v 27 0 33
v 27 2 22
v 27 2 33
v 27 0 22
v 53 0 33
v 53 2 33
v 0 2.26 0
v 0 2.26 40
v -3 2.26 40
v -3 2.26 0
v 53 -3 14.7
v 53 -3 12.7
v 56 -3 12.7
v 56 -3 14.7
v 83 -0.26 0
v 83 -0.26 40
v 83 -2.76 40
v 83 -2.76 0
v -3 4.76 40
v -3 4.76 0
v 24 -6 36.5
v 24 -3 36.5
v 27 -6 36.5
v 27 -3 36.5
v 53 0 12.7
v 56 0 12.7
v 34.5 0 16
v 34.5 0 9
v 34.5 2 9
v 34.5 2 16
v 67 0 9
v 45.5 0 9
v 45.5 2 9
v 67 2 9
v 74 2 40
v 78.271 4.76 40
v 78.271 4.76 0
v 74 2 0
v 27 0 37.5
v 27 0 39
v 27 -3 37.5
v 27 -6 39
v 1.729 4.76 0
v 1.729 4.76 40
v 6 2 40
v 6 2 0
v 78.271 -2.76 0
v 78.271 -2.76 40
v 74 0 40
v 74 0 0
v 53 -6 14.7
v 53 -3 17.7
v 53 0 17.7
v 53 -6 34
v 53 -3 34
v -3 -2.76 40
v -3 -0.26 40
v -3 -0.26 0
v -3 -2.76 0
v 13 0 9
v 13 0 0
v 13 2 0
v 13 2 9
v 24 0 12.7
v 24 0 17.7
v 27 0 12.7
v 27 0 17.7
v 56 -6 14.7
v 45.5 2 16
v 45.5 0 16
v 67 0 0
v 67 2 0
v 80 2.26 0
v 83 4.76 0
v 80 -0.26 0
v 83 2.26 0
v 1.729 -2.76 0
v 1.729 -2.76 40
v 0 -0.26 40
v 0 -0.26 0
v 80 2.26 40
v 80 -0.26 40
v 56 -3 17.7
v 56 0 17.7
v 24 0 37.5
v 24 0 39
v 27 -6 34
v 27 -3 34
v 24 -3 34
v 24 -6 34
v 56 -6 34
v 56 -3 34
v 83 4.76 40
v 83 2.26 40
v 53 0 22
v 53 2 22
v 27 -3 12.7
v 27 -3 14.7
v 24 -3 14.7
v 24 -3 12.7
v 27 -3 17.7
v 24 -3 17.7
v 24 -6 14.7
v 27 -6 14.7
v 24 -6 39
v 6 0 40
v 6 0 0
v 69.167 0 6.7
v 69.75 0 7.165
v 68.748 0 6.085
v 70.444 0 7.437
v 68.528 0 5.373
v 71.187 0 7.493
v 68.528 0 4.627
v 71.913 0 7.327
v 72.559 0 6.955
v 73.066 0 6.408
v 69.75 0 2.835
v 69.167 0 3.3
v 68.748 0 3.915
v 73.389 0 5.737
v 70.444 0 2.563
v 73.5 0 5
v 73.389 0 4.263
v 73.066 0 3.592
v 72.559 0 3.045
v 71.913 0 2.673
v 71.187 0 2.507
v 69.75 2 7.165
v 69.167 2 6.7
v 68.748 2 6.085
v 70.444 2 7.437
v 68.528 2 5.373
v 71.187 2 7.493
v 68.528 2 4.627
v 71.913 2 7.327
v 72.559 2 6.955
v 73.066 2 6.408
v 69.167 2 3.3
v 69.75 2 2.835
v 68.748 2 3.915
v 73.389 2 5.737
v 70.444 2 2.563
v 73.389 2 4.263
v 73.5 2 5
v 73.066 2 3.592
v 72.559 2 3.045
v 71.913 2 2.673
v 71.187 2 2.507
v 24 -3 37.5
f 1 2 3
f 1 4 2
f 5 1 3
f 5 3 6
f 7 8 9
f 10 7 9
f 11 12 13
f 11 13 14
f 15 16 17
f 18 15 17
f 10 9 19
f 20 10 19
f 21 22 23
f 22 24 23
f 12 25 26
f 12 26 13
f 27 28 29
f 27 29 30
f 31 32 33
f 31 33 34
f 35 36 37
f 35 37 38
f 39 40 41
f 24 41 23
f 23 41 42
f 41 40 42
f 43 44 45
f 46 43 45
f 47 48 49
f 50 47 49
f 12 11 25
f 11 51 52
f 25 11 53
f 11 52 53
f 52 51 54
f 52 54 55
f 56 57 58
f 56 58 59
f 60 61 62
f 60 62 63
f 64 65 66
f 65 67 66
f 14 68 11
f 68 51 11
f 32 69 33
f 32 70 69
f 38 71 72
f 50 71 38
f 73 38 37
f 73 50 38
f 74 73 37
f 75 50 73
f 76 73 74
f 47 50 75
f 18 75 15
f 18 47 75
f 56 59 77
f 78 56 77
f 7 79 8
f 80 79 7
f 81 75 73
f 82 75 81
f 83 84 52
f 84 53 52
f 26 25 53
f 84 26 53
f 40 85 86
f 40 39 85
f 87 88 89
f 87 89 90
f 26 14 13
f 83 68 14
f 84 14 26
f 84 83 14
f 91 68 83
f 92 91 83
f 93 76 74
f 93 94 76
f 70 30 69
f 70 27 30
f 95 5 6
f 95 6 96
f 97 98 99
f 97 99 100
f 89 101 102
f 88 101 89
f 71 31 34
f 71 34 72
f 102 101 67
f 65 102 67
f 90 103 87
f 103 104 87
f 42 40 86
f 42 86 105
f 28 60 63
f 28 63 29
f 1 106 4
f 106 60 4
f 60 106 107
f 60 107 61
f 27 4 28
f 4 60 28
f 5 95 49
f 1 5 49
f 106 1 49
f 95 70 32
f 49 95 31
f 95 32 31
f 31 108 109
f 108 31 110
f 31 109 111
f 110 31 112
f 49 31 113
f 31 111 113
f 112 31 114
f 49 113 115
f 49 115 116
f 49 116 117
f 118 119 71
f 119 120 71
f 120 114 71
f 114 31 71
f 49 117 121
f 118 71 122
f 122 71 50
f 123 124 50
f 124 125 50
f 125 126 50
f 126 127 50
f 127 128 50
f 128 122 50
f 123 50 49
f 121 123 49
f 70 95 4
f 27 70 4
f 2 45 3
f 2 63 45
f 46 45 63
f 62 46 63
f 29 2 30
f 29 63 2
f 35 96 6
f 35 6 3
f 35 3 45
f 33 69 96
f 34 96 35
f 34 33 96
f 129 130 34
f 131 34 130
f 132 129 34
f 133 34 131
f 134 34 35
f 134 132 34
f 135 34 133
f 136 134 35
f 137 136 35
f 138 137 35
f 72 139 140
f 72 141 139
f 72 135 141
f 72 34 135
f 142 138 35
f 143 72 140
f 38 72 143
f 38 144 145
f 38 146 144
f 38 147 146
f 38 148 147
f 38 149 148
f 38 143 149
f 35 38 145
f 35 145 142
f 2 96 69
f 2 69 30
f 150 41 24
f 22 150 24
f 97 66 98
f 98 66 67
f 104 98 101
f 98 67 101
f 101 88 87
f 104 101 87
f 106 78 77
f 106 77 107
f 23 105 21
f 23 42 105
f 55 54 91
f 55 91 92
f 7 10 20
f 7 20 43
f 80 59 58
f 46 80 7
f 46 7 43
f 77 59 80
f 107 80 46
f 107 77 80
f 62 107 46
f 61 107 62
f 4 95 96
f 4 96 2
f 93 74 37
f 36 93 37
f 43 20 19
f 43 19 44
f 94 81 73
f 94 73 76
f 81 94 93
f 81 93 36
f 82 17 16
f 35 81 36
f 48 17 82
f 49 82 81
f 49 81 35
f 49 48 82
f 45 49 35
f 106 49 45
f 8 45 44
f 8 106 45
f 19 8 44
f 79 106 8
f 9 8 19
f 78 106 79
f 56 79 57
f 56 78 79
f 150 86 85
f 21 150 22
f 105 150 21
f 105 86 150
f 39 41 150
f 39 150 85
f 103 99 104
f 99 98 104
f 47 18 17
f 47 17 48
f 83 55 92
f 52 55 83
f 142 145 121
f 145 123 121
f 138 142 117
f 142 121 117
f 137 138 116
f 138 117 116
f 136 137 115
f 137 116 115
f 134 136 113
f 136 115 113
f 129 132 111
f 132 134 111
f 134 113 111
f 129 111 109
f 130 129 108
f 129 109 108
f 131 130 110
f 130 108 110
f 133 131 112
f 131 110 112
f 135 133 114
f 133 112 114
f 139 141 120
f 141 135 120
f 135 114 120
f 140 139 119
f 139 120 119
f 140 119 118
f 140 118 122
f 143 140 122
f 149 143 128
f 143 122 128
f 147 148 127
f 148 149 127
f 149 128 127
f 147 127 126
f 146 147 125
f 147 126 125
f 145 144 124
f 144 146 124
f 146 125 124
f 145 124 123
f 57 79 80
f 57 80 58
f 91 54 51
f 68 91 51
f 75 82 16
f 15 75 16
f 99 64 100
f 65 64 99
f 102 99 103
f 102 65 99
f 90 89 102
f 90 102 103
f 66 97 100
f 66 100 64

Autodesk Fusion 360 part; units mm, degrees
sketch "Sketch1" plane through (0, 0, 0) normal (0, 1, 0) x (1, 0, 0) in component "wire_organizer"
  line L0 (0, 0) -> (80, 0)
  line L1 (80, 0) -> (80, -40)
  line L2 (80, -40) -> (0, -40)
  line L3 (0, -40) -> (0, 0)
  line L4 (34.5, -16) -> (45.5, -16)
  line L5 (45.5, -16) -> (45.5, -9)
  line L6 (45.5, -9) -> (34.5, -9)
  line L7 (34.5, -9) -> (34.5, -16)
  circle A0 centre (71, -5) radius 2.5
  line L8 (27, -33) -> (53, -33)
  line L9 (53, -33) -> (53, -22)
  line L10 (53, -22) -> (27, -22)
  line L11 (27, -22) -> (27, -33)
  line L12 (40, -40) -> (40, -26) construction
  line L13 (67, 0) -> (13, 0)
  line L14 (13, 0) -> (13, -9)
  line L15 (13, -9) -> (67, -9)
  line L16 (67, -9) -> (67, 0)
  dimension "d1" = 80
  dimension "d2" = 40
  dimension "d3" = 11
  dimension "d4" = 7
  dimension "d5" = 5
  dimension "d6" = 26
  dimension "d7" = 11
  dimension "d9" = 5
  dimension "d15" = 54
  dimension "d16" = 9
  dimension "d17" = 6
  dimension "d42" = 4
extrude "Extrude1" add sketch "Sketch1" along normal blind 2 contours L0 L1 L2 L3 L4 L5 L7 L14 L15 L16 makes body 1 in component "wire_organizer"
ref_plane "WorkPlane1" through (27, 1, 20) normal (-1, 0, 0) x (0, 0, 1) in component "wire_organizer"
sketch "Sketch3" plane through (27, 0, 0) normal (-1, 0, 0) x (0, -1, 0) in component "wire_organizer"
  line L0 (0, 14.7) -> (6, 14.7)
  line L1 (6, 14.7) -> (6, 17.7)
  line L2 (6, 17.7) -> (0, 17.7)
  line L3 (0, 17.7) -> (0, 14.7)
  line L4 (6, 17.7) -> (3, 17.7)
  line L5 (3, 17.7) -> (3, 34)
  line L6 (3, 34) -> (6, 34)
  line L7 (6, 34) -> (6, 17.7)
  line L8 (0, 0) -> (0, 40)
  line L9 (0, 14.7) -> (3, 14.7)
  line L10 (3, 14.7) -> (3, 12.7)
  line L11 (3, 12.7) -> (0, 12.7)
  line L12 (0, 12.7) -> (0, 14.7)
  line L13 (0, 22) -> (0, 33)
  line L14 (0, 39) -> (6, 39)
  line L15 (6, 39) -> (6, 37.5)
  line L16 (6, 37.5) -> (0, 37.5)
  line L17 (0, 37.5) -> (0, 39)
  line L18 (6, 37.5) -> (3, 37.5)
  line L19 (3, 37.5) -> (3, 36.5)
  line L20 (3, 36.5) -> (6, 36.5)
  line L21 (6, 36.5) -> (6, 37.5)
  point P0 (0, 22)
  dimension "d23" = 3
  dimension "d24" = 3
  dimension "d25" = 3
  dimension "d26" = 3
  dimension "d27" = 2
  dimension "d30" = 4.3
  dimension "d40" = 1.5
  dimension "d41" = 1
extrude "Extrude2" add sketch "Sketch3" along normal blind 3 separate body makes body 2 at (27, -5, 22.1333) makes body 3 at (26, -2, 39) in component "wire_organizer"
ref_plane "WorkPlane2" through (40, 1, 27.5) normal (-1, 0, 0) x (0, 0, 1) in component "wire_organizer"
mirror "Mirror1" about plane through (40, 1, 27.5) normal (-1, 0, 0) of bodies 2 makes body 4 in component "wire_organizer"
sketch "Sketch6" plane through (0, 0, 40) normal (0, 0, 1) x (-1, 0, 0) in component "wire_organizer"
  line L0 (-80, 0) -> (-80, -2)
  line L1 (0, -2) -> (-1.7287, -2)
  line L2 (-1.7287, -2) -> (-1.7287, -2.26)
  line L3 (-1.7287, -2.26) -> (0, -2.26)
  line L4 (0, -2.26) -> (0, -2)
  line L5 (-1.7287, -2.26) -> (3, -2.26)
  line L6 (3, -2.26) -> (3, -4.76)
  line L7 (3, -4.76) -> (-1.7287, -4.76)
  line L8 (-1.7287, -4.76) -> (-1.7287, -2.26)
  line L9 (0, 0) -> (0, -2)
  line L10 (0, -1) -> (3.7998, -1) construction
  line L11 (-1.7287, -4.76) -> (-6, -2)
  line L12 (0, -2) -> (-80, -2)
  line L13 (-1.7287, 2.76) -> (-6, 0)
  line L14 (-1.7287, 2.76) -> (-1.7287, 0.26)
  line L15 (3, 2.76) -> (-1.7287, 2.76)
  line L16 (3, 0.26) -> (3, 2.76)
  line L17 (-1.7287, 0.26) -> (3, 0.26)
  line L18 (0, 0) -> (-1.7287, 0)
  line L19 (-1.7287, 0) -> (-1.7287, 0.26)
  line L20 (0, 0.26) -> (0, 0)
  line L21 (-80, 0) -> (0, 0)
  line L22 (-40, -2) -> (-40, -11) construction
  line L23 (-40, -2) -> (-40, -11) construction
  line L24 (-78.2713, -4.76) -> (-74, -2)
  line L25 (-80, -2.26) -> (-80, -2)
  line L26 (0, 0) -> (-80, 0)
  line L27 (-78.2713, -4.76) -> (-78.2713, -2.26)
  line L28 (-83, 0.26) -> (-83, 2.76)
  line L29 (-78.2713, -2.26) -> (-83, -2.26)
  line L30 (-78.2713, 0.26) -> (-83, 0.26)
  line L31 (-78.2713, -2) -> (-78.2713, -2.26)
  line L32 (-80, 0.26) -> (-80, 0)
  line L33 (-83, 2.76) -> (-78.2713, 2.76)
  line L34 (-78.2713, 0) -> (-78.2713, 0.26)
  line L35 (-78.2713, 2.76) -> (-74, 0)
  line L36 (-80, 0) -> (-78.2713, 0)
  line L37 (-80, -2) -> (0, -2)
  line L38 (-78.2713, 2.76) -> (-78.2713, 0.26)
  line L39 (-80, -2) -> (-78.2713, -2)
  line L40 (-78.2713, -2.26) -> (-80, -2.26)
  line L41 (-80, 0) -> (-80, -2)
  line L42 (-83, -4.76) -> (-78.2713, -4.76)
  line L43 (-83, -2.26) -> (-83, -4.76)
  line L44 (-80, -1) -> (-83.7998, -1) construction
  point P0 (-80, 0)
  dimension "d36" = 1.26
  dimension "d37" = 2.5
extrude "Extrude4" add sketch "Sketch6" against normal up to surface (40 mm away) contours L21 L26 L30 L32 L34 L36 | L12 L25 L29 L31 L37 L39 L40 | L21 L26 L34 L35 L38 | L28 L30 L33 L38 | L12 L24 L27 L31 L37 | L27 L29 L40 L42 L43 | L13 L14 L19 L21 L26 | L2 L8 L11 L12 L37 | L14 L15 L16 L17 | L17 L18 L19 L20 L21 L26 | L3 L5 L6 L7 L8 | L1 L2 L3 L4 L5 L12 L37 bodies 1 in component "wire_organizer"
component "wire_organizer" placed x (1, 0, 0) y (0, 1, 0) z (0, 0, 1) at (0, 0, 0)
equation "d24 = d23"
equation "d26 = d23"
equation "d36 = ( 2.52 / 2 ) * 1 mm"
